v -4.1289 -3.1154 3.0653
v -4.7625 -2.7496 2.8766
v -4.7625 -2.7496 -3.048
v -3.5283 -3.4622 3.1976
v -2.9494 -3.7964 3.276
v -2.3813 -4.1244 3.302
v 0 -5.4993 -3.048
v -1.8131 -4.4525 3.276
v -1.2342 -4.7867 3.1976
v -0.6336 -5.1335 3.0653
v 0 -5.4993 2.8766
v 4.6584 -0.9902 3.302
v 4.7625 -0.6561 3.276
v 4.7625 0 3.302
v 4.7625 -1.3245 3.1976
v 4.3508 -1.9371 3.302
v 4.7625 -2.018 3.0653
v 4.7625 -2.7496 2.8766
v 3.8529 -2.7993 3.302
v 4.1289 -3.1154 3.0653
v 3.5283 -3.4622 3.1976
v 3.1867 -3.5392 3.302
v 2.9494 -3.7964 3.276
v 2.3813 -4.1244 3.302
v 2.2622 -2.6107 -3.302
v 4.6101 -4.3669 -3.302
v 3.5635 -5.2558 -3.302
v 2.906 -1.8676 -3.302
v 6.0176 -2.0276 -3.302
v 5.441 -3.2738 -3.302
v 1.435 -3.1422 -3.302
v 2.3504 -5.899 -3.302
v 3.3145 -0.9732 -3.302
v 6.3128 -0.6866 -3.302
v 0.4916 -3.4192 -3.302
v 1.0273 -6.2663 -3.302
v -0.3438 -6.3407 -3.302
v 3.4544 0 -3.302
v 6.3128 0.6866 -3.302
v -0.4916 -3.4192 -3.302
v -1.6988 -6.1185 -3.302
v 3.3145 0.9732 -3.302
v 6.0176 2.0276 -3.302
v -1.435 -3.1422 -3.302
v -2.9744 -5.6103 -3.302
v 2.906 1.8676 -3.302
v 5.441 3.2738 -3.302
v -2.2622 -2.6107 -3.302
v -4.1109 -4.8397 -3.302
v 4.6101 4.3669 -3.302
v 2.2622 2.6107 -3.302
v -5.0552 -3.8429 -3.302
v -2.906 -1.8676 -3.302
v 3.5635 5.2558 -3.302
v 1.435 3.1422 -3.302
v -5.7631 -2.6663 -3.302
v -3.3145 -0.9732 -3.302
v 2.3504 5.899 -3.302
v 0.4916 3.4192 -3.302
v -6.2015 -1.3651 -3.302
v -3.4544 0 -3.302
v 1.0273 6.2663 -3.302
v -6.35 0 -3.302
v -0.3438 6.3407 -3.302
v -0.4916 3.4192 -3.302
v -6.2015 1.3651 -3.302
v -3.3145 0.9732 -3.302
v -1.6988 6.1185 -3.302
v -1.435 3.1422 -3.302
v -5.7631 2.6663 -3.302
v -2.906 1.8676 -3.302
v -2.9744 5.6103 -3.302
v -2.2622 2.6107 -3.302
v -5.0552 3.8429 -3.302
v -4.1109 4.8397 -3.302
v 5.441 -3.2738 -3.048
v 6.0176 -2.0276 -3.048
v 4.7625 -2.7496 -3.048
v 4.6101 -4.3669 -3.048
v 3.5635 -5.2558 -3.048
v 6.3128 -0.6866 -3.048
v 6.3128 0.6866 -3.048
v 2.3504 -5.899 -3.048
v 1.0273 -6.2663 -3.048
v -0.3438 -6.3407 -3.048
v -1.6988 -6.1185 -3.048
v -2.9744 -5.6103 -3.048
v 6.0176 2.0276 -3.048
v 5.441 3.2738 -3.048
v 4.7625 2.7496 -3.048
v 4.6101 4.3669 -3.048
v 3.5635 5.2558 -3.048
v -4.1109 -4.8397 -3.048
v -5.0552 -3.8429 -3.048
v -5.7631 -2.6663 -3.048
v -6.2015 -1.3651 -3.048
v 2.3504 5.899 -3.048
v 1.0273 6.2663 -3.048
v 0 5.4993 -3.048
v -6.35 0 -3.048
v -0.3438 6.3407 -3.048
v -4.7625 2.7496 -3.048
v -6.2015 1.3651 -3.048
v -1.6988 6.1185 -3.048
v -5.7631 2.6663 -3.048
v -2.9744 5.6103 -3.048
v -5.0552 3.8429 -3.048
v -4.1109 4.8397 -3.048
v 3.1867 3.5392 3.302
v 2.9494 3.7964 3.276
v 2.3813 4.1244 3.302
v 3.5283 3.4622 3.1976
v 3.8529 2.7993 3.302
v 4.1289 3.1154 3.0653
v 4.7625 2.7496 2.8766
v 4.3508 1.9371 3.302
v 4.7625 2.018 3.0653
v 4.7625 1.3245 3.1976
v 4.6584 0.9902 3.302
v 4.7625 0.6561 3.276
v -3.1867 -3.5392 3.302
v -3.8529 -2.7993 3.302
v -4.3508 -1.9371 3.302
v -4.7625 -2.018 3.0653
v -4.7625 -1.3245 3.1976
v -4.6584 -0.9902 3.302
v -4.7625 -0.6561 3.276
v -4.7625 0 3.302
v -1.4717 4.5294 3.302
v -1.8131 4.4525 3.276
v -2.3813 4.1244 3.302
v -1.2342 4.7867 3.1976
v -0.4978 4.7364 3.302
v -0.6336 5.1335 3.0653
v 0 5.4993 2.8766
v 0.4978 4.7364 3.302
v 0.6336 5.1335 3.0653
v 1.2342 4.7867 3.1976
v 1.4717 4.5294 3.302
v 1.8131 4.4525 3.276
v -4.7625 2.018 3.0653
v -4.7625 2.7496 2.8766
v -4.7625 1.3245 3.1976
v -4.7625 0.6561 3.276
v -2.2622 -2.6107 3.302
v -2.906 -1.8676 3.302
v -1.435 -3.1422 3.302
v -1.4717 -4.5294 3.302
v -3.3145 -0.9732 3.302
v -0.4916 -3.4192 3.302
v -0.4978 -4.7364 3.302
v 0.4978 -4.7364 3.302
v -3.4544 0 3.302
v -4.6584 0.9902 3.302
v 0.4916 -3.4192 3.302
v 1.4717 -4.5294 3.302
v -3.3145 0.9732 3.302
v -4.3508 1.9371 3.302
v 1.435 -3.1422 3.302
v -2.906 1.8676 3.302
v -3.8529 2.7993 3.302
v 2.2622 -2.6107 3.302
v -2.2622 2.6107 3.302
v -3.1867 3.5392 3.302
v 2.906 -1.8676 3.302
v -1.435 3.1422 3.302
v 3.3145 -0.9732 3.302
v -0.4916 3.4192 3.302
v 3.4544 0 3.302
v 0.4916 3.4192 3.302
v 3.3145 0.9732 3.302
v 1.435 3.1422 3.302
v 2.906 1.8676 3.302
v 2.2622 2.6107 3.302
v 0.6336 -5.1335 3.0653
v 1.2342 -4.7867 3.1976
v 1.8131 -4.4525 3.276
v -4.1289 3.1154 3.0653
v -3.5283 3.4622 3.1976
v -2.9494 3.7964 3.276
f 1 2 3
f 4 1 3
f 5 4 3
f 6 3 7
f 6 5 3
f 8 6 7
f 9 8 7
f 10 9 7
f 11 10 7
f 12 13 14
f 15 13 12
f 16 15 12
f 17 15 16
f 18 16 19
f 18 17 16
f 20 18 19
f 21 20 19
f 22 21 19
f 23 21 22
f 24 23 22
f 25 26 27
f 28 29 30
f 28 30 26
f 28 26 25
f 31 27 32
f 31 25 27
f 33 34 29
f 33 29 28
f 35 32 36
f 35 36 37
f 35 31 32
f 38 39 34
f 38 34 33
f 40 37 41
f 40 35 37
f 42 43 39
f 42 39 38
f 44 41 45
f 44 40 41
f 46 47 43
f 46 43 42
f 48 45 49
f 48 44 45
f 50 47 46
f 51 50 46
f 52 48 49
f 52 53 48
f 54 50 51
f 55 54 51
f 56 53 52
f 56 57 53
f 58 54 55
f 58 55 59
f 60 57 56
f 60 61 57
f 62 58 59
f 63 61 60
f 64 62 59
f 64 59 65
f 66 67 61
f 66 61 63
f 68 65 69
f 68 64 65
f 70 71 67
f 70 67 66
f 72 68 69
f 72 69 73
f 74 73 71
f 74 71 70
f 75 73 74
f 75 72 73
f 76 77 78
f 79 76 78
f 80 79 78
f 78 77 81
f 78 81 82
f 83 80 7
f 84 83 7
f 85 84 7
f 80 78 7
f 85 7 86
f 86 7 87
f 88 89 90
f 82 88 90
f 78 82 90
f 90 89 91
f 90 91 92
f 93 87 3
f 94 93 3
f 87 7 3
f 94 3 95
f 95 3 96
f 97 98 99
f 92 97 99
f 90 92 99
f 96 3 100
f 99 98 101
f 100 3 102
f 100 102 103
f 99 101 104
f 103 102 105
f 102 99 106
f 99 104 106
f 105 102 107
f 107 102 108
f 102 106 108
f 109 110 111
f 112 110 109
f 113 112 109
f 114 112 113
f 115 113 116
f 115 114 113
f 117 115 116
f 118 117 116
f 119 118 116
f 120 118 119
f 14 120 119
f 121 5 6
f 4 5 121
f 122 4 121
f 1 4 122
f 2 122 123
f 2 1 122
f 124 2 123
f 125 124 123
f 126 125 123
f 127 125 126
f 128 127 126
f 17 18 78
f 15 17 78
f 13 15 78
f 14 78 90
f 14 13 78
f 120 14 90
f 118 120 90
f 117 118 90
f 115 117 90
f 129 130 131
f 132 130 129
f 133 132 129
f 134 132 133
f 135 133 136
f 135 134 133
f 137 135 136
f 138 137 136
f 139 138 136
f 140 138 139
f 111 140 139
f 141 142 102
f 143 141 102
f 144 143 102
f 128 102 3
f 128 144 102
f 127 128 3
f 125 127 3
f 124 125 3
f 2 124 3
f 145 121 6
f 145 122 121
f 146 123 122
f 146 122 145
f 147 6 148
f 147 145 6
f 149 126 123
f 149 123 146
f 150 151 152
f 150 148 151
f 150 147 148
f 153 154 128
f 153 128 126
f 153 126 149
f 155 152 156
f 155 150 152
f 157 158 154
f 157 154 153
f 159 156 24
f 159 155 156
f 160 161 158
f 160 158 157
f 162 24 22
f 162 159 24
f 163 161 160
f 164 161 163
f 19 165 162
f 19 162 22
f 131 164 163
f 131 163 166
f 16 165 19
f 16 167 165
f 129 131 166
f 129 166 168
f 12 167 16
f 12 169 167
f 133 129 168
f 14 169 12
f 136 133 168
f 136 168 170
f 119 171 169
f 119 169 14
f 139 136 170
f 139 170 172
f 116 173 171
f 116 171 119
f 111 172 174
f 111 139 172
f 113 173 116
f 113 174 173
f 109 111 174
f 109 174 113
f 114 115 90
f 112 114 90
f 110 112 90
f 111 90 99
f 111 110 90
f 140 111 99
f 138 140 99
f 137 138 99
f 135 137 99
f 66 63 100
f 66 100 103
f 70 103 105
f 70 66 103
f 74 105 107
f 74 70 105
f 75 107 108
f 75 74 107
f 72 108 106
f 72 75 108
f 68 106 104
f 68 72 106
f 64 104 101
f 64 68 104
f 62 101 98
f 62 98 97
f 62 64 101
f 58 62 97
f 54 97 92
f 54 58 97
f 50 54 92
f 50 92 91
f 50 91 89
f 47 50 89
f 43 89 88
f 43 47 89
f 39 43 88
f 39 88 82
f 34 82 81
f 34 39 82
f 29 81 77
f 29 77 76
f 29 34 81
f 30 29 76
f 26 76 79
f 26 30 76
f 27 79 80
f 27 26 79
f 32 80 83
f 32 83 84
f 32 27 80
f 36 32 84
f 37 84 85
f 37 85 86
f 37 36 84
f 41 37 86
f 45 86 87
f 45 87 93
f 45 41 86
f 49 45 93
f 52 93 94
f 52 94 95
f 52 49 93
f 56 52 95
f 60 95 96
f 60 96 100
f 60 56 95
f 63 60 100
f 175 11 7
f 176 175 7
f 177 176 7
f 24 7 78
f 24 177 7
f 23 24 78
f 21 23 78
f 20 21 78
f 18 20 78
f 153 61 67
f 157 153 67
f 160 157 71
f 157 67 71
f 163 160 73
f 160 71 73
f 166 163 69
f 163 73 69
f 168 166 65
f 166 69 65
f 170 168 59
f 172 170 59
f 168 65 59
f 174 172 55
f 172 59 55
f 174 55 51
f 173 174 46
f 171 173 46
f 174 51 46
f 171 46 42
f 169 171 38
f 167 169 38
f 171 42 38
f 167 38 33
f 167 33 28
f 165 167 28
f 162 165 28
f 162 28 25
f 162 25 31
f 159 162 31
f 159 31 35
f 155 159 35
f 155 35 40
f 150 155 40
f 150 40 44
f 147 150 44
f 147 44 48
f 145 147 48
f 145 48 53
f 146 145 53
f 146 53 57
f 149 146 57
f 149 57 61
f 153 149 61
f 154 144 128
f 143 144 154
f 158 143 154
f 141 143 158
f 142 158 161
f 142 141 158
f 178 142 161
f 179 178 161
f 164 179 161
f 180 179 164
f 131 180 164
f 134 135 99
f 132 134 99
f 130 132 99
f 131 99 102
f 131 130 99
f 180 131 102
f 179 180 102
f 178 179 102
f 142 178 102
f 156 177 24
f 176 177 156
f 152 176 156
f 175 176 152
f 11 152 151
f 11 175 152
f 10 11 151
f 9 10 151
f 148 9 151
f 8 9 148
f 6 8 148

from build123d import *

# Parameters (mm, degrees)
EXTRUDE1_DEPTH           = 3.302
SKETCH2_OUTSIDE_W        = 41.061
SKETCH2_OUTSIDE_H        = 42.534
SKETCH2_OUTSIDE_R        = 4.7625
CUT_EXTRUDE1_DEPTH       = 7.604
CUT_EXTRUDE1_TAPER       = 60
SKETCH17_R               = 6.35
EXTRUDE3_DEPTH           = 0.254
F_5_16_24_TAPPED_HOLE1_D = 6.9088


with BuildPart() as part:
    # Sketch1 → Extrude1 (new body, symmetric)
    with BuildSketch(Plane.XY):
        Polygon((4.7625, -2.749630657), (4.7625, 2.749630657), (0, 5.499261314), (-4.7625, 2.749630657), (-4.7625, -2.749630657), (0, -5.499261314), align=None)
    extrude(amount=EXTRUDE1_DEPTH, both=True)

    # Sketch2 outside → Cut-Extrude1 (cut, through all)
    with BuildSketch(Plane.XY.offset(3.302)):
        with Locations((-0.0005, 0)):
            Rectangle(SKETCH2_OUTSIDE_W, SKETCH2_OUTSIDE_H)
        Circle(SKETCH2_OUTSIDE_R, mode=Mode.SUBTRACT)
    extrude(amount=-CUT_EXTRUDE1_DEPTH, taper=CUT_EXTRUDE1_TAPER, mode=Mode.SUBTRACT)

    # Sketch17 → Extrude3 (add)
    with BuildSketch(Plane(origin=(0, 0, -3.302), x_dir=(-1, 0, 0), z_dir=(0, 0, -1))):
        Circle(SKETCH17_R)
    extrude(amount=-EXTRUDE3_DEPTH)

    # 5/16-24 Tapped Hole1 (through all)
    with Locations(Plane.XY.offset(3.302)):
        with Locations((0, 0)):
            Hole(F_5_16_24_TAPPED_HOLE1_D / 2)


solid = part.part
